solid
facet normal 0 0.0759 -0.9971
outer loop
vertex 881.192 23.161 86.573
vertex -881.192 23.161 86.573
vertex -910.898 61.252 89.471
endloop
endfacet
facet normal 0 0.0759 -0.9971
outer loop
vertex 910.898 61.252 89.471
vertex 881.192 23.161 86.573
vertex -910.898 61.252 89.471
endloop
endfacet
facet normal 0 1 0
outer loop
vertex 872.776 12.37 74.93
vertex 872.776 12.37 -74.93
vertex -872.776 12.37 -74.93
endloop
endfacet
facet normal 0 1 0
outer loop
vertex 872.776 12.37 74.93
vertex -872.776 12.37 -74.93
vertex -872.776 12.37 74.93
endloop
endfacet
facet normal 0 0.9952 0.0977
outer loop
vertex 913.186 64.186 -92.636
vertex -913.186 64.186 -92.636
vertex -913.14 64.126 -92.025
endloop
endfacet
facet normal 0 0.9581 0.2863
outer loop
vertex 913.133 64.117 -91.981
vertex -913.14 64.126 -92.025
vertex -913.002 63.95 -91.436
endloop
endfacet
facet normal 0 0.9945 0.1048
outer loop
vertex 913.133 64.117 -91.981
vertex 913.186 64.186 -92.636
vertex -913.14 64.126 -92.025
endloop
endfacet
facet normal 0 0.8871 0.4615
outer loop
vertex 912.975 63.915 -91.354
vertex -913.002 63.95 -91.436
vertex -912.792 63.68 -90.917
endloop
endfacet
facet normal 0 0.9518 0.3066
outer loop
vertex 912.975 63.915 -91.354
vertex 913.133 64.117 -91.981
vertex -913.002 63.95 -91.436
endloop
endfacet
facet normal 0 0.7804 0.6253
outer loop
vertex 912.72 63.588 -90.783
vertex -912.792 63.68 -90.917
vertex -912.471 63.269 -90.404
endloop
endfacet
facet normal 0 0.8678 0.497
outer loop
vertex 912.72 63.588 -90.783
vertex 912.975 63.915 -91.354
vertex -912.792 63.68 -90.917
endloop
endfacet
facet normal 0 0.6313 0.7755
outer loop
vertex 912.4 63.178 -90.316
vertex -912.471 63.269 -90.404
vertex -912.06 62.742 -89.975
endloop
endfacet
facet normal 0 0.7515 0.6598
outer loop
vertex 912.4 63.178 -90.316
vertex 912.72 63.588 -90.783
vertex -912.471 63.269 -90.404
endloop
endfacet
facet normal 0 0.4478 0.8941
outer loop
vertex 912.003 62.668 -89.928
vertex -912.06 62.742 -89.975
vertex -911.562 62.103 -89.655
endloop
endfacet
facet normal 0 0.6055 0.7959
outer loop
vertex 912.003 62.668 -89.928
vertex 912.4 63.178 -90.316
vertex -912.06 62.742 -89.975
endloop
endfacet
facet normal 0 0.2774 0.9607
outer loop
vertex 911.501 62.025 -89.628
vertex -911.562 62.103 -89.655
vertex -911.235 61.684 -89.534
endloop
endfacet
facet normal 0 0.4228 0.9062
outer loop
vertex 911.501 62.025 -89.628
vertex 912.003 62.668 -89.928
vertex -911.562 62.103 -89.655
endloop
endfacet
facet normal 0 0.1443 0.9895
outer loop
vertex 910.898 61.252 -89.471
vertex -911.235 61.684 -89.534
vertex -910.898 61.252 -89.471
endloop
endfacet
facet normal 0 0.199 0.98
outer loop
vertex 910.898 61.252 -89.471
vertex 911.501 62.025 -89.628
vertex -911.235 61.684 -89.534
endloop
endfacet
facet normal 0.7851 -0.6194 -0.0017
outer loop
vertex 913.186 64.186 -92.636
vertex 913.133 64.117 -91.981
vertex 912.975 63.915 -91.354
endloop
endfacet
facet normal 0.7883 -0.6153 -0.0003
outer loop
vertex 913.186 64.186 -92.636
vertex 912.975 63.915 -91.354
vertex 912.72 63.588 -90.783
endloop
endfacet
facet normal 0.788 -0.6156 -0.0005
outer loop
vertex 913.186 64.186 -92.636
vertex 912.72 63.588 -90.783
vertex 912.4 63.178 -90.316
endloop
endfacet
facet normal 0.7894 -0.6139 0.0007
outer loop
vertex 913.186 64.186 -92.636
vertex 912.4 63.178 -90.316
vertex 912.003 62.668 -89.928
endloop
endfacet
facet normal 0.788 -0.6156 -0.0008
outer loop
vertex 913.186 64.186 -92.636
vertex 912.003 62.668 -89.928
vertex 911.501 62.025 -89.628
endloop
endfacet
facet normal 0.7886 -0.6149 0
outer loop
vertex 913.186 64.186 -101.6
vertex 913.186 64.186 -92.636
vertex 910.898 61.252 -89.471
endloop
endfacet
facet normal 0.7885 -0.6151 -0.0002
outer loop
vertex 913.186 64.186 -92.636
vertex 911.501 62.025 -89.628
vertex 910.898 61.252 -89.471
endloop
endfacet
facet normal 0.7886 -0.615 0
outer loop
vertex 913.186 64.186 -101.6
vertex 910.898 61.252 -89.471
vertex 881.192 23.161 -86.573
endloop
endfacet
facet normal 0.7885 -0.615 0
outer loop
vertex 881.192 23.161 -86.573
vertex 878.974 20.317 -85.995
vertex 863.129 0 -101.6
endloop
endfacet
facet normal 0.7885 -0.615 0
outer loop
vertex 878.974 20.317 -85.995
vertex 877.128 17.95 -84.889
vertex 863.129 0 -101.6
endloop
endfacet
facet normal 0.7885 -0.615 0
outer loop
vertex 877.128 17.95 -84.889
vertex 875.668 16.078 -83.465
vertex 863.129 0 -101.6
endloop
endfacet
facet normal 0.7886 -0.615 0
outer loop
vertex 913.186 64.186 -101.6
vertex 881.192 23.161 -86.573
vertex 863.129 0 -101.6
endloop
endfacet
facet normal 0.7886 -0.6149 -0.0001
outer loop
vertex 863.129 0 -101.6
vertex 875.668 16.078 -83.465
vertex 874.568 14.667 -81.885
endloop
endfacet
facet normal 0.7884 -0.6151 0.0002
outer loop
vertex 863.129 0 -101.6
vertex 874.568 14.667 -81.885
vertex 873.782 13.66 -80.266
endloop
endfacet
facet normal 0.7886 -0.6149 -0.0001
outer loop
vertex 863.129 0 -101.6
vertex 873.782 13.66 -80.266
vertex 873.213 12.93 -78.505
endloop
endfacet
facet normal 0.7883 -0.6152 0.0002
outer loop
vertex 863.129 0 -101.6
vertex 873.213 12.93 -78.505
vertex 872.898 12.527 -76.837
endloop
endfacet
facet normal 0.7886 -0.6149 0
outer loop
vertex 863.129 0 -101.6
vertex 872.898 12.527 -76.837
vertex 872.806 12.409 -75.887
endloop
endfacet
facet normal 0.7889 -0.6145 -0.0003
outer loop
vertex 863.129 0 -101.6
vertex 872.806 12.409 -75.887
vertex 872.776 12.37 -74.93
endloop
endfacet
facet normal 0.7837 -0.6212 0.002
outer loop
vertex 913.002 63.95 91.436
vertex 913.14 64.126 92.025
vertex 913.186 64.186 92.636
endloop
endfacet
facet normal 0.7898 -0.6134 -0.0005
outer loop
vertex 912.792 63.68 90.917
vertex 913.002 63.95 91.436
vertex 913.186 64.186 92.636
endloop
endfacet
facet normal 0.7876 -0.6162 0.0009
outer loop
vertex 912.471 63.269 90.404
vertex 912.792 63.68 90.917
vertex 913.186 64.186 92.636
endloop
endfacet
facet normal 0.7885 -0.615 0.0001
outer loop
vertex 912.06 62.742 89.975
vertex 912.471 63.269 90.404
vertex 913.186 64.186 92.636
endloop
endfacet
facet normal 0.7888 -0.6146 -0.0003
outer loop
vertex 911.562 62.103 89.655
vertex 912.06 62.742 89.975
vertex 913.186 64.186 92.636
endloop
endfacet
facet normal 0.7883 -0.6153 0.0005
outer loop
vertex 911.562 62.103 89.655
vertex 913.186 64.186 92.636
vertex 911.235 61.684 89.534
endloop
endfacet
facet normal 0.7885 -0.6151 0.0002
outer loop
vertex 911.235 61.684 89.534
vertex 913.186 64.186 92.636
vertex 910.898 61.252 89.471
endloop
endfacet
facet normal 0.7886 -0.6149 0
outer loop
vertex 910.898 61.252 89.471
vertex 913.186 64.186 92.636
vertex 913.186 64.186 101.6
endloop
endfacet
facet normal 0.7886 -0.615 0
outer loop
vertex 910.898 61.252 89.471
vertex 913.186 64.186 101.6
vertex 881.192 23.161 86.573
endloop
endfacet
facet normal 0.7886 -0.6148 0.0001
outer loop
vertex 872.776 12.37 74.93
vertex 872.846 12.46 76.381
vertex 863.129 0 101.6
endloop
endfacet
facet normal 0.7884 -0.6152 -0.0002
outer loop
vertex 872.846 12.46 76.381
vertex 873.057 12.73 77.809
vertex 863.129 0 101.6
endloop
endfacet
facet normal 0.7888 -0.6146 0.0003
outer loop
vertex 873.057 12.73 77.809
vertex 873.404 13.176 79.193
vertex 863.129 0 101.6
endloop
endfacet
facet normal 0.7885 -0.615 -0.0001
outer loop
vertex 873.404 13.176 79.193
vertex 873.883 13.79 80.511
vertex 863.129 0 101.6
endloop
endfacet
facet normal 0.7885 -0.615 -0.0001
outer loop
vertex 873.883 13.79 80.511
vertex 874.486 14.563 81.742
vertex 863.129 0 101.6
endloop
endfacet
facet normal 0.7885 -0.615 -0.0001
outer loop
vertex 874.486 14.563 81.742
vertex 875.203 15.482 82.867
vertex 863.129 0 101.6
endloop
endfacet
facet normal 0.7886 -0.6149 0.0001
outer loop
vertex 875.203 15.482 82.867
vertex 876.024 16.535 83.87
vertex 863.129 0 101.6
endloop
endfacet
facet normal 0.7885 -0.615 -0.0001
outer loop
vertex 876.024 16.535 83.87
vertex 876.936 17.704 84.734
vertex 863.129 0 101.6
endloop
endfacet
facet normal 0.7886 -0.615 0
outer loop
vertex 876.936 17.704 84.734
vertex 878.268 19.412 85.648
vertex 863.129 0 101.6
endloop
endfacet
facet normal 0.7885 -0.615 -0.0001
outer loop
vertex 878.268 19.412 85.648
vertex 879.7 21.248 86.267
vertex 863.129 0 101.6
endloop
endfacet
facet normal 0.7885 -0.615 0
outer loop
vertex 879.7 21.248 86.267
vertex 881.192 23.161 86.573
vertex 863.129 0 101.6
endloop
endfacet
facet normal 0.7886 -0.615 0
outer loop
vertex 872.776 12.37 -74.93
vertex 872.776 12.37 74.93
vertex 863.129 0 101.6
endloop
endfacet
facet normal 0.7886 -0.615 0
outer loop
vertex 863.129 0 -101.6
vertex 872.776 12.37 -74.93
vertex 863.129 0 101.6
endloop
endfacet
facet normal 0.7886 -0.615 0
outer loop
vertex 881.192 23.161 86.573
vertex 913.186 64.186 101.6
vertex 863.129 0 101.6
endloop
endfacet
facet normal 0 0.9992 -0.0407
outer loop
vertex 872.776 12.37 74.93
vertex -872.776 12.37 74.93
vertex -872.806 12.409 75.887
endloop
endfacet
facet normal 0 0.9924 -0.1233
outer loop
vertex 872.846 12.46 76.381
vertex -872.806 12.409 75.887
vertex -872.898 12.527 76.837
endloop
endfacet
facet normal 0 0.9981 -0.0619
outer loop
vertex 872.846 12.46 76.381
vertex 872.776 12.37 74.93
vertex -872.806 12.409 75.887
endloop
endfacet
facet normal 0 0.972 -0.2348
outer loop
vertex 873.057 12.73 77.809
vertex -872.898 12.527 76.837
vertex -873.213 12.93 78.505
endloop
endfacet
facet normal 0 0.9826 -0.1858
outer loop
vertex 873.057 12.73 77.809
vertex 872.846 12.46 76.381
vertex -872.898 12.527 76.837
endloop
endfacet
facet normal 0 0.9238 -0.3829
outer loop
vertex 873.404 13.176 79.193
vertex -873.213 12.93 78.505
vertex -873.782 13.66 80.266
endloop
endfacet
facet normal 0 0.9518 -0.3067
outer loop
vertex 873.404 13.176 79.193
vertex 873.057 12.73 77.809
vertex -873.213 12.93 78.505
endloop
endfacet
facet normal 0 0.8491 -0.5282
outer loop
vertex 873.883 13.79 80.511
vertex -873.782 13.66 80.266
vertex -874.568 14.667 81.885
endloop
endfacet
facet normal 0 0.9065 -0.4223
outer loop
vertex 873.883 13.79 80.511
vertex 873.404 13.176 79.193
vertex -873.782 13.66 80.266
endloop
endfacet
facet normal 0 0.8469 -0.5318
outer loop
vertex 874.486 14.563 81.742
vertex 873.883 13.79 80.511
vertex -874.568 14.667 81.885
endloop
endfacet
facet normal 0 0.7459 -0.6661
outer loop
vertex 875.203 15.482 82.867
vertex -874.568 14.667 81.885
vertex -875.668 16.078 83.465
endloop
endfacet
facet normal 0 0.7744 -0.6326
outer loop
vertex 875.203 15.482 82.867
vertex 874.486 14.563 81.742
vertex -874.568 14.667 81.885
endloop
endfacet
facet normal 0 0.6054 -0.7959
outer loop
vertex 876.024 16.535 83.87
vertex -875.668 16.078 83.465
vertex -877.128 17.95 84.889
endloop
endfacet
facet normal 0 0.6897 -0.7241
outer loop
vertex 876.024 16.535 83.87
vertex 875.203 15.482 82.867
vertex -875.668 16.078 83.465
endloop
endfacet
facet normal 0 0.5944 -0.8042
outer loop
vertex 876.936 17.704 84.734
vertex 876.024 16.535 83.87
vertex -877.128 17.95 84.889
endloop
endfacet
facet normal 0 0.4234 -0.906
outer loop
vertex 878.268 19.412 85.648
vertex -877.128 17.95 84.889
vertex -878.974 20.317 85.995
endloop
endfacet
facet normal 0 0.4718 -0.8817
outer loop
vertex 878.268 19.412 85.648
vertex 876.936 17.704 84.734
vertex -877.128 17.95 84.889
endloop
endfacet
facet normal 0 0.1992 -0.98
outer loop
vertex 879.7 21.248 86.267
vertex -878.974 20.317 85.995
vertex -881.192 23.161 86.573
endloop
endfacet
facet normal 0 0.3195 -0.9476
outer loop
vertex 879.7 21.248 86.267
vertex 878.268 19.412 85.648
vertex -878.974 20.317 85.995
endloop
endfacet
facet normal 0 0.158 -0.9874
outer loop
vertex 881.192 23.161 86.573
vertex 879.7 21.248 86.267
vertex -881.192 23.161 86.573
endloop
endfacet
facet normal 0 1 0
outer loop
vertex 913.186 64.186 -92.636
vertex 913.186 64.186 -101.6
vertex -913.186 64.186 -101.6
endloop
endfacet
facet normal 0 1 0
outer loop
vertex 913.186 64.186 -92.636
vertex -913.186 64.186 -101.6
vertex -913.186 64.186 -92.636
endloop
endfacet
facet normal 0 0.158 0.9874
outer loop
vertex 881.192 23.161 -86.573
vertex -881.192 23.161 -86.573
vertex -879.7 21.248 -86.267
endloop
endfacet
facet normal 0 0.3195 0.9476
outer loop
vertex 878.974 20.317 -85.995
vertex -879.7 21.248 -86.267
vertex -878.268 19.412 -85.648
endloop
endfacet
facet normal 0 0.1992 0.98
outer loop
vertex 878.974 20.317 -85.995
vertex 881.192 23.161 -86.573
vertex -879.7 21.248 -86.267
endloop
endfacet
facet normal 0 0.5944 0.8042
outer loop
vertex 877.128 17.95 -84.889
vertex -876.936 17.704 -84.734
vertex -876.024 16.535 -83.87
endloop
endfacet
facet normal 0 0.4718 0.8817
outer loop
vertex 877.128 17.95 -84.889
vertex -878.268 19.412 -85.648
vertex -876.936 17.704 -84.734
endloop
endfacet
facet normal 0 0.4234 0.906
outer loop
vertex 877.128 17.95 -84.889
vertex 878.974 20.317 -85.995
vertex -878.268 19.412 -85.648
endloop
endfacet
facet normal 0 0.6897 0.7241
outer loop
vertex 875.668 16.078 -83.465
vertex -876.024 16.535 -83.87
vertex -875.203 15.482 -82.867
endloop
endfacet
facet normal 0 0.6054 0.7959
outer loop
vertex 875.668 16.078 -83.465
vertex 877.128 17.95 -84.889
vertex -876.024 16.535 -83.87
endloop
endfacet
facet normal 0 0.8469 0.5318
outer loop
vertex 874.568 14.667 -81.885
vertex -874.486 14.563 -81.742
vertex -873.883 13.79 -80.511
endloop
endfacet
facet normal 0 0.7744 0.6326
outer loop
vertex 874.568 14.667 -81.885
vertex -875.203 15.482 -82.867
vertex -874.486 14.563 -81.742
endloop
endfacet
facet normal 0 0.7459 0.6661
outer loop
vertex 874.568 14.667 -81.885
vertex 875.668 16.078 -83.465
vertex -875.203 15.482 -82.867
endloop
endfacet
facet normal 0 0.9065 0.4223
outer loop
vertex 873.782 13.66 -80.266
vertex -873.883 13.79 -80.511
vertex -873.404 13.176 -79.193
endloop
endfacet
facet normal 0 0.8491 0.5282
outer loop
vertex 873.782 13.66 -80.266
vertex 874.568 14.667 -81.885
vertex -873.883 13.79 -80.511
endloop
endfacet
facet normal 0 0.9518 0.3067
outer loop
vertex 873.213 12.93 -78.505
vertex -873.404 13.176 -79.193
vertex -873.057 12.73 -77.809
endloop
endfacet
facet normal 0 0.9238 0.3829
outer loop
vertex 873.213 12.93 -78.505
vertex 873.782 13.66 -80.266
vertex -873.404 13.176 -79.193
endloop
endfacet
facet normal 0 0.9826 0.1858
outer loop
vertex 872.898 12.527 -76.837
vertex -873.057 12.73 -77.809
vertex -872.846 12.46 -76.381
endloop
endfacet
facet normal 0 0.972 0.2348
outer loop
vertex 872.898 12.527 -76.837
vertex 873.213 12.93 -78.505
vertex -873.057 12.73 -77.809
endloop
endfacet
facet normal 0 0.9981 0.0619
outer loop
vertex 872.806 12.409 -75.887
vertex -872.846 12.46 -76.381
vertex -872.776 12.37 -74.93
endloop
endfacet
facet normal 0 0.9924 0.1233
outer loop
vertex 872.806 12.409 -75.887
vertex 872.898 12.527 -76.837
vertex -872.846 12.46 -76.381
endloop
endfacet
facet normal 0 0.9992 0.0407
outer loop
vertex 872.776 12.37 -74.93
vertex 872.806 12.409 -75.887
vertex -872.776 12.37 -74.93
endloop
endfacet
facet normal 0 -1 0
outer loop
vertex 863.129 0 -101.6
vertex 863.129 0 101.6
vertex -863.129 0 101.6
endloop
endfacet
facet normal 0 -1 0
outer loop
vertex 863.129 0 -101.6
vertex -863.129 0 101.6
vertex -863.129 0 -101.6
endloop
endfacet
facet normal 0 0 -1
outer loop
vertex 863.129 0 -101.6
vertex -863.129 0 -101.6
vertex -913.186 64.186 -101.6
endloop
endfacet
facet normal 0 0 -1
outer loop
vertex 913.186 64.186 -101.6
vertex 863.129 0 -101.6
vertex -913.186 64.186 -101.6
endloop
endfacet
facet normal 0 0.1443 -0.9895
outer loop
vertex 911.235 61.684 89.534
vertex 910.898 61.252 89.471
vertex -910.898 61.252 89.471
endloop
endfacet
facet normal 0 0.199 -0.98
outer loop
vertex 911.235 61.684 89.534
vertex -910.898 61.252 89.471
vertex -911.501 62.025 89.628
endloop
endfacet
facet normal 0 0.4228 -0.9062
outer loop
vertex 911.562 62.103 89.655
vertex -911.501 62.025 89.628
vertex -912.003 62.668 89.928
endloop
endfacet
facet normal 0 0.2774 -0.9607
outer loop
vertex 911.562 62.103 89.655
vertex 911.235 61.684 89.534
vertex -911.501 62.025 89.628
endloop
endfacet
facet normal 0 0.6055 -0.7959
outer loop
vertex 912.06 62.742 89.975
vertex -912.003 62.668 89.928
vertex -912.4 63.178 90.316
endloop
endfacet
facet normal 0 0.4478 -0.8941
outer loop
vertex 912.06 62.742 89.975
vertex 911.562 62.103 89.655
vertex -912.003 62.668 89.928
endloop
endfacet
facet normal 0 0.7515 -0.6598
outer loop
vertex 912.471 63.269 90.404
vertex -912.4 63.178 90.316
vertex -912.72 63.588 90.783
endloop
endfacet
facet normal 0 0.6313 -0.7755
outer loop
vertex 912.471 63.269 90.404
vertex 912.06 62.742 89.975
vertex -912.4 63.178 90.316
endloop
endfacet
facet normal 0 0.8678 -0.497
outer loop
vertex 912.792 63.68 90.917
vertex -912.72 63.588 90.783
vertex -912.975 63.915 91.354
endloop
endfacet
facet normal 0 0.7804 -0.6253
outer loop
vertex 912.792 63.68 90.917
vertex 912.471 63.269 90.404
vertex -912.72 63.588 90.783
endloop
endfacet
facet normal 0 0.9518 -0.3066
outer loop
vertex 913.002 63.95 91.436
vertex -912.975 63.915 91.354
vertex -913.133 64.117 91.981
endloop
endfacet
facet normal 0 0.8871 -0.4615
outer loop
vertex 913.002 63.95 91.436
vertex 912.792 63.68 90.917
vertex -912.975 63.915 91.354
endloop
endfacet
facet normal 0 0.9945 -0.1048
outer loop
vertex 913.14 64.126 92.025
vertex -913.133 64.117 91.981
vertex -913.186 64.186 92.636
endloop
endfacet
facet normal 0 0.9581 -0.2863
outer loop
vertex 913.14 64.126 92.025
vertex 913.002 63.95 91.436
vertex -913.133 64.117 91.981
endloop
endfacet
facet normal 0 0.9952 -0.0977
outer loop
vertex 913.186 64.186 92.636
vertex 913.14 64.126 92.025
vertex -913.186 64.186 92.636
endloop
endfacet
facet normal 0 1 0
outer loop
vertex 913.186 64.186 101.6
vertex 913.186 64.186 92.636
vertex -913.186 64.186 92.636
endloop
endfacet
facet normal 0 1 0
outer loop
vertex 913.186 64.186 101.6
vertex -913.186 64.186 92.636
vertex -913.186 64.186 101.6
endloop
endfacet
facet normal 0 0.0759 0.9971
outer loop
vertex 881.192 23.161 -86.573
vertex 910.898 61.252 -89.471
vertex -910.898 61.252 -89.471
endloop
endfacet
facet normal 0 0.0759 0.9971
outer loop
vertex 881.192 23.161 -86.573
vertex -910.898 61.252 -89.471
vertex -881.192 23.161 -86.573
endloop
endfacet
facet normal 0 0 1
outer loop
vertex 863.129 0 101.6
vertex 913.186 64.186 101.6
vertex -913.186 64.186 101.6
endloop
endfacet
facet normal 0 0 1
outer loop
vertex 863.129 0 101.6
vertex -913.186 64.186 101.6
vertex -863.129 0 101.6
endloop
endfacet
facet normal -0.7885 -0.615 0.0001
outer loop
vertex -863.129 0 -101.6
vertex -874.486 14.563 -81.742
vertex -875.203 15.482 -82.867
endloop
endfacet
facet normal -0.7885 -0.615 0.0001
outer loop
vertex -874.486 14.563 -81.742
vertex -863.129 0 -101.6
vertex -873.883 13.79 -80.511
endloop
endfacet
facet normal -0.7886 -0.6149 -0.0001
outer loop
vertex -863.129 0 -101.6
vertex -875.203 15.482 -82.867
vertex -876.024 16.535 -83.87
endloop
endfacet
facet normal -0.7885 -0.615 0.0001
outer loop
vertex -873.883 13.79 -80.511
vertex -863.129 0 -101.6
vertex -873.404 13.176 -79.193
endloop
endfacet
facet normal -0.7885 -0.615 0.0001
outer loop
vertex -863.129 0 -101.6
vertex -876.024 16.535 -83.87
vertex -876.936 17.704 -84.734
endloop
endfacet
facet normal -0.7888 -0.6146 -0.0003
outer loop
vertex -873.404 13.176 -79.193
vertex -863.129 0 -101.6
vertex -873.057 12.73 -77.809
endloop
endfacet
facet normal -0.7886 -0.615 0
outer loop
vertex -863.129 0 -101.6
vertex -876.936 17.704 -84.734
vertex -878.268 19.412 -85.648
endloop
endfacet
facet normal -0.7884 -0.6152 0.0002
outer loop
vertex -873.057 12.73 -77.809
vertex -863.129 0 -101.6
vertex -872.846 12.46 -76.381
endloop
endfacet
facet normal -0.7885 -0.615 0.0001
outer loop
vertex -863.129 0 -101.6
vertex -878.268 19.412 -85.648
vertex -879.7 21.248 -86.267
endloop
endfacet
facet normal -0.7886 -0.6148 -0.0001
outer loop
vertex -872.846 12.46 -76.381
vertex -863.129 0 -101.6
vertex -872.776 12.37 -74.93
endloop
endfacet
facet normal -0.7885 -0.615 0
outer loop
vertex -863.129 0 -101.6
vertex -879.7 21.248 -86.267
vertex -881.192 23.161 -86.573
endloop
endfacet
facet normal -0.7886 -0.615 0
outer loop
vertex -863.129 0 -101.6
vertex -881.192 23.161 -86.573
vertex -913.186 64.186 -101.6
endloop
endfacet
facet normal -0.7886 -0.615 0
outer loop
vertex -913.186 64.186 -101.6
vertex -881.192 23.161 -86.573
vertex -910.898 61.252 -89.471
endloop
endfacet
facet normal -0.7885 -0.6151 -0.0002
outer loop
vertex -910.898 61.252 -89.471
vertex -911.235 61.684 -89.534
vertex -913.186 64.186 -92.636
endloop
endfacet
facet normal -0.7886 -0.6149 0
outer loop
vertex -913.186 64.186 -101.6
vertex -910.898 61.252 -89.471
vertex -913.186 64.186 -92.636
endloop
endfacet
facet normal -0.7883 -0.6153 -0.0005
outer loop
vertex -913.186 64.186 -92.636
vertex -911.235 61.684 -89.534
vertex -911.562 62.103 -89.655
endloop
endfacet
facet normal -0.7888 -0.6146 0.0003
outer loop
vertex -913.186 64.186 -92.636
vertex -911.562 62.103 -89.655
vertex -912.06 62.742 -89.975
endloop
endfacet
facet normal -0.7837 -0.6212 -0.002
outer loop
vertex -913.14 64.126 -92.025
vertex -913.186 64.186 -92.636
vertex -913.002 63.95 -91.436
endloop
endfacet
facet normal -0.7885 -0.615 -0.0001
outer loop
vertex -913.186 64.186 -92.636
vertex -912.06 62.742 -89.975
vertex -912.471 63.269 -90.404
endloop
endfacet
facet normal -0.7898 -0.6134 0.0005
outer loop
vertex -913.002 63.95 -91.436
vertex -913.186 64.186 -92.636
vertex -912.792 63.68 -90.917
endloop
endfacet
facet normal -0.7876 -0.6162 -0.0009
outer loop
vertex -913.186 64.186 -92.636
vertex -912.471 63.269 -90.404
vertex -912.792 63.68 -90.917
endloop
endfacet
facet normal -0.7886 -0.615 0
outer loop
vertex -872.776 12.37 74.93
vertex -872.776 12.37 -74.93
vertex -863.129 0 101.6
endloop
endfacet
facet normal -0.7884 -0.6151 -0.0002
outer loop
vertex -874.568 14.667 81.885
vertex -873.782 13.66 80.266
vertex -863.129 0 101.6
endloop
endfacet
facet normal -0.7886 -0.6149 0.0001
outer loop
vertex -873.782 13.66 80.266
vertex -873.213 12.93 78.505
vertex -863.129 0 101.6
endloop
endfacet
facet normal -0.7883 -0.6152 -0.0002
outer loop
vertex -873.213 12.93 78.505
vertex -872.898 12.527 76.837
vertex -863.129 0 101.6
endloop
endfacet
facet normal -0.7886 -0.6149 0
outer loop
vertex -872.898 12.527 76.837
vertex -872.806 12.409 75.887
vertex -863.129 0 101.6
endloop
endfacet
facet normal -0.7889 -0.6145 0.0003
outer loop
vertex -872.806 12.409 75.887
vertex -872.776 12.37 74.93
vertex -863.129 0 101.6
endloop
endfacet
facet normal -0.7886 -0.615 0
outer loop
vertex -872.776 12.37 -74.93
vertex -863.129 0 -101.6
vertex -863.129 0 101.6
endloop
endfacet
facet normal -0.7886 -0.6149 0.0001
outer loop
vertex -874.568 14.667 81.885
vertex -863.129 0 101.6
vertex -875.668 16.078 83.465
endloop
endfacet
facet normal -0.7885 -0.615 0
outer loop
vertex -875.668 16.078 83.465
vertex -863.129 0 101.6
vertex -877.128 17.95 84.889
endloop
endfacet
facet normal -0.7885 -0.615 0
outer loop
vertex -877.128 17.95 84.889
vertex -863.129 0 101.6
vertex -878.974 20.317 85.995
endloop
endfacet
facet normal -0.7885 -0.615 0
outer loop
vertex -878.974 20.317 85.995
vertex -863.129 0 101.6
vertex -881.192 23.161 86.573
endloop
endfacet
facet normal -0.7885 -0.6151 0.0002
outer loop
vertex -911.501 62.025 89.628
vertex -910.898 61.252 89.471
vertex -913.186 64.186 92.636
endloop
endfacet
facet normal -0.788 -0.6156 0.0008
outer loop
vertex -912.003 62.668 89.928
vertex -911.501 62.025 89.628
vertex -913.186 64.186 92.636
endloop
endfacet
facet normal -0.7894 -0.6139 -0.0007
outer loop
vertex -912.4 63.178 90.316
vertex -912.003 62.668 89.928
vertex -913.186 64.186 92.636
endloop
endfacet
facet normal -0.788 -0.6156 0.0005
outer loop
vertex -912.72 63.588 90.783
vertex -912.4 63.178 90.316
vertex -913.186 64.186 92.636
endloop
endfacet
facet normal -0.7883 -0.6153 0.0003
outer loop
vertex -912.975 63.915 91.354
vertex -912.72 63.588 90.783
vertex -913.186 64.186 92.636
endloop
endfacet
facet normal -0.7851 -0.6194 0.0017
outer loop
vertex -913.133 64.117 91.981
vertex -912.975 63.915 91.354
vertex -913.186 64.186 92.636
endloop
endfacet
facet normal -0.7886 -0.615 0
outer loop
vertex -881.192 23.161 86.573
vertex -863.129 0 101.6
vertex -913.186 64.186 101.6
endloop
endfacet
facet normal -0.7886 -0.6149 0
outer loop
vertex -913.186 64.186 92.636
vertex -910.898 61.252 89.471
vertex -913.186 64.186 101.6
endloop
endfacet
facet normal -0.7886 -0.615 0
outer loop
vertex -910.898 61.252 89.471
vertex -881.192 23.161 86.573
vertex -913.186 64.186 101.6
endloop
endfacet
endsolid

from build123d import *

# Parameters (mm, degrees)
F1_DEPTH = 927.1
F3_DEPTH = 203.201


with BuildPart() as f1:
    # F0 (on Right) → F1 (new body, symmetric)
    with BuildSketch(Plane.YZ):
        with BuildLine():
            Line((64.1858, 101.6), (0, 101.6))
            Line((0, 101.6), (0, -101.6))
            Line((0, -101.6), (64.1858, -101.6))
            Line((64.1858, -101.6), (64.1858, -92.636418))
            ThreePointArc((64.1858, -92.636418), (63.339447, -90.478171), (61.251608, -89.470563))
            Line((61.251608, -89.470563), (23.161034, -86.573234))
            ThreePointArc((23.161034, -86.573234), (15.482479, -82.8675), (12.3698, -74.93))
            Line((12.3698, -74.93), (12.3698, 74.93))
            ThreePointArc((12.3698, 74.93), (15.482479, 82.8675), (23.161034, 86.573234))
            Line((23.161034, 86.573234), (61.251608, 89.470563))
            ThreePointArc((61.251608, 89.470563), (63.339447, 90.478171), (64.1858, 92.636418))
            Line((64.1858, 92.636418), (64.1858, 101.6))
        make_face()
    extrude(amount=F1_DEPTH, both=True)

    # F2 (on face) → F3 (cut, through all)
    with BuildSketch(Plane.XY.offset(101.6)):
        Polygon((-913.186131, 64.1858), (-927.1, 64.1858), (-927.1, 0), (-863.12883, 0), align=None)
        Polygon((927.1, 0), (927.1, 64.1858), (913.186131, 64.1858), (863.12883, 0), align=None)
    extrude(amount=-F3_DEPTH, mode=Mode.SUBTRACT)


solid = f1.part
